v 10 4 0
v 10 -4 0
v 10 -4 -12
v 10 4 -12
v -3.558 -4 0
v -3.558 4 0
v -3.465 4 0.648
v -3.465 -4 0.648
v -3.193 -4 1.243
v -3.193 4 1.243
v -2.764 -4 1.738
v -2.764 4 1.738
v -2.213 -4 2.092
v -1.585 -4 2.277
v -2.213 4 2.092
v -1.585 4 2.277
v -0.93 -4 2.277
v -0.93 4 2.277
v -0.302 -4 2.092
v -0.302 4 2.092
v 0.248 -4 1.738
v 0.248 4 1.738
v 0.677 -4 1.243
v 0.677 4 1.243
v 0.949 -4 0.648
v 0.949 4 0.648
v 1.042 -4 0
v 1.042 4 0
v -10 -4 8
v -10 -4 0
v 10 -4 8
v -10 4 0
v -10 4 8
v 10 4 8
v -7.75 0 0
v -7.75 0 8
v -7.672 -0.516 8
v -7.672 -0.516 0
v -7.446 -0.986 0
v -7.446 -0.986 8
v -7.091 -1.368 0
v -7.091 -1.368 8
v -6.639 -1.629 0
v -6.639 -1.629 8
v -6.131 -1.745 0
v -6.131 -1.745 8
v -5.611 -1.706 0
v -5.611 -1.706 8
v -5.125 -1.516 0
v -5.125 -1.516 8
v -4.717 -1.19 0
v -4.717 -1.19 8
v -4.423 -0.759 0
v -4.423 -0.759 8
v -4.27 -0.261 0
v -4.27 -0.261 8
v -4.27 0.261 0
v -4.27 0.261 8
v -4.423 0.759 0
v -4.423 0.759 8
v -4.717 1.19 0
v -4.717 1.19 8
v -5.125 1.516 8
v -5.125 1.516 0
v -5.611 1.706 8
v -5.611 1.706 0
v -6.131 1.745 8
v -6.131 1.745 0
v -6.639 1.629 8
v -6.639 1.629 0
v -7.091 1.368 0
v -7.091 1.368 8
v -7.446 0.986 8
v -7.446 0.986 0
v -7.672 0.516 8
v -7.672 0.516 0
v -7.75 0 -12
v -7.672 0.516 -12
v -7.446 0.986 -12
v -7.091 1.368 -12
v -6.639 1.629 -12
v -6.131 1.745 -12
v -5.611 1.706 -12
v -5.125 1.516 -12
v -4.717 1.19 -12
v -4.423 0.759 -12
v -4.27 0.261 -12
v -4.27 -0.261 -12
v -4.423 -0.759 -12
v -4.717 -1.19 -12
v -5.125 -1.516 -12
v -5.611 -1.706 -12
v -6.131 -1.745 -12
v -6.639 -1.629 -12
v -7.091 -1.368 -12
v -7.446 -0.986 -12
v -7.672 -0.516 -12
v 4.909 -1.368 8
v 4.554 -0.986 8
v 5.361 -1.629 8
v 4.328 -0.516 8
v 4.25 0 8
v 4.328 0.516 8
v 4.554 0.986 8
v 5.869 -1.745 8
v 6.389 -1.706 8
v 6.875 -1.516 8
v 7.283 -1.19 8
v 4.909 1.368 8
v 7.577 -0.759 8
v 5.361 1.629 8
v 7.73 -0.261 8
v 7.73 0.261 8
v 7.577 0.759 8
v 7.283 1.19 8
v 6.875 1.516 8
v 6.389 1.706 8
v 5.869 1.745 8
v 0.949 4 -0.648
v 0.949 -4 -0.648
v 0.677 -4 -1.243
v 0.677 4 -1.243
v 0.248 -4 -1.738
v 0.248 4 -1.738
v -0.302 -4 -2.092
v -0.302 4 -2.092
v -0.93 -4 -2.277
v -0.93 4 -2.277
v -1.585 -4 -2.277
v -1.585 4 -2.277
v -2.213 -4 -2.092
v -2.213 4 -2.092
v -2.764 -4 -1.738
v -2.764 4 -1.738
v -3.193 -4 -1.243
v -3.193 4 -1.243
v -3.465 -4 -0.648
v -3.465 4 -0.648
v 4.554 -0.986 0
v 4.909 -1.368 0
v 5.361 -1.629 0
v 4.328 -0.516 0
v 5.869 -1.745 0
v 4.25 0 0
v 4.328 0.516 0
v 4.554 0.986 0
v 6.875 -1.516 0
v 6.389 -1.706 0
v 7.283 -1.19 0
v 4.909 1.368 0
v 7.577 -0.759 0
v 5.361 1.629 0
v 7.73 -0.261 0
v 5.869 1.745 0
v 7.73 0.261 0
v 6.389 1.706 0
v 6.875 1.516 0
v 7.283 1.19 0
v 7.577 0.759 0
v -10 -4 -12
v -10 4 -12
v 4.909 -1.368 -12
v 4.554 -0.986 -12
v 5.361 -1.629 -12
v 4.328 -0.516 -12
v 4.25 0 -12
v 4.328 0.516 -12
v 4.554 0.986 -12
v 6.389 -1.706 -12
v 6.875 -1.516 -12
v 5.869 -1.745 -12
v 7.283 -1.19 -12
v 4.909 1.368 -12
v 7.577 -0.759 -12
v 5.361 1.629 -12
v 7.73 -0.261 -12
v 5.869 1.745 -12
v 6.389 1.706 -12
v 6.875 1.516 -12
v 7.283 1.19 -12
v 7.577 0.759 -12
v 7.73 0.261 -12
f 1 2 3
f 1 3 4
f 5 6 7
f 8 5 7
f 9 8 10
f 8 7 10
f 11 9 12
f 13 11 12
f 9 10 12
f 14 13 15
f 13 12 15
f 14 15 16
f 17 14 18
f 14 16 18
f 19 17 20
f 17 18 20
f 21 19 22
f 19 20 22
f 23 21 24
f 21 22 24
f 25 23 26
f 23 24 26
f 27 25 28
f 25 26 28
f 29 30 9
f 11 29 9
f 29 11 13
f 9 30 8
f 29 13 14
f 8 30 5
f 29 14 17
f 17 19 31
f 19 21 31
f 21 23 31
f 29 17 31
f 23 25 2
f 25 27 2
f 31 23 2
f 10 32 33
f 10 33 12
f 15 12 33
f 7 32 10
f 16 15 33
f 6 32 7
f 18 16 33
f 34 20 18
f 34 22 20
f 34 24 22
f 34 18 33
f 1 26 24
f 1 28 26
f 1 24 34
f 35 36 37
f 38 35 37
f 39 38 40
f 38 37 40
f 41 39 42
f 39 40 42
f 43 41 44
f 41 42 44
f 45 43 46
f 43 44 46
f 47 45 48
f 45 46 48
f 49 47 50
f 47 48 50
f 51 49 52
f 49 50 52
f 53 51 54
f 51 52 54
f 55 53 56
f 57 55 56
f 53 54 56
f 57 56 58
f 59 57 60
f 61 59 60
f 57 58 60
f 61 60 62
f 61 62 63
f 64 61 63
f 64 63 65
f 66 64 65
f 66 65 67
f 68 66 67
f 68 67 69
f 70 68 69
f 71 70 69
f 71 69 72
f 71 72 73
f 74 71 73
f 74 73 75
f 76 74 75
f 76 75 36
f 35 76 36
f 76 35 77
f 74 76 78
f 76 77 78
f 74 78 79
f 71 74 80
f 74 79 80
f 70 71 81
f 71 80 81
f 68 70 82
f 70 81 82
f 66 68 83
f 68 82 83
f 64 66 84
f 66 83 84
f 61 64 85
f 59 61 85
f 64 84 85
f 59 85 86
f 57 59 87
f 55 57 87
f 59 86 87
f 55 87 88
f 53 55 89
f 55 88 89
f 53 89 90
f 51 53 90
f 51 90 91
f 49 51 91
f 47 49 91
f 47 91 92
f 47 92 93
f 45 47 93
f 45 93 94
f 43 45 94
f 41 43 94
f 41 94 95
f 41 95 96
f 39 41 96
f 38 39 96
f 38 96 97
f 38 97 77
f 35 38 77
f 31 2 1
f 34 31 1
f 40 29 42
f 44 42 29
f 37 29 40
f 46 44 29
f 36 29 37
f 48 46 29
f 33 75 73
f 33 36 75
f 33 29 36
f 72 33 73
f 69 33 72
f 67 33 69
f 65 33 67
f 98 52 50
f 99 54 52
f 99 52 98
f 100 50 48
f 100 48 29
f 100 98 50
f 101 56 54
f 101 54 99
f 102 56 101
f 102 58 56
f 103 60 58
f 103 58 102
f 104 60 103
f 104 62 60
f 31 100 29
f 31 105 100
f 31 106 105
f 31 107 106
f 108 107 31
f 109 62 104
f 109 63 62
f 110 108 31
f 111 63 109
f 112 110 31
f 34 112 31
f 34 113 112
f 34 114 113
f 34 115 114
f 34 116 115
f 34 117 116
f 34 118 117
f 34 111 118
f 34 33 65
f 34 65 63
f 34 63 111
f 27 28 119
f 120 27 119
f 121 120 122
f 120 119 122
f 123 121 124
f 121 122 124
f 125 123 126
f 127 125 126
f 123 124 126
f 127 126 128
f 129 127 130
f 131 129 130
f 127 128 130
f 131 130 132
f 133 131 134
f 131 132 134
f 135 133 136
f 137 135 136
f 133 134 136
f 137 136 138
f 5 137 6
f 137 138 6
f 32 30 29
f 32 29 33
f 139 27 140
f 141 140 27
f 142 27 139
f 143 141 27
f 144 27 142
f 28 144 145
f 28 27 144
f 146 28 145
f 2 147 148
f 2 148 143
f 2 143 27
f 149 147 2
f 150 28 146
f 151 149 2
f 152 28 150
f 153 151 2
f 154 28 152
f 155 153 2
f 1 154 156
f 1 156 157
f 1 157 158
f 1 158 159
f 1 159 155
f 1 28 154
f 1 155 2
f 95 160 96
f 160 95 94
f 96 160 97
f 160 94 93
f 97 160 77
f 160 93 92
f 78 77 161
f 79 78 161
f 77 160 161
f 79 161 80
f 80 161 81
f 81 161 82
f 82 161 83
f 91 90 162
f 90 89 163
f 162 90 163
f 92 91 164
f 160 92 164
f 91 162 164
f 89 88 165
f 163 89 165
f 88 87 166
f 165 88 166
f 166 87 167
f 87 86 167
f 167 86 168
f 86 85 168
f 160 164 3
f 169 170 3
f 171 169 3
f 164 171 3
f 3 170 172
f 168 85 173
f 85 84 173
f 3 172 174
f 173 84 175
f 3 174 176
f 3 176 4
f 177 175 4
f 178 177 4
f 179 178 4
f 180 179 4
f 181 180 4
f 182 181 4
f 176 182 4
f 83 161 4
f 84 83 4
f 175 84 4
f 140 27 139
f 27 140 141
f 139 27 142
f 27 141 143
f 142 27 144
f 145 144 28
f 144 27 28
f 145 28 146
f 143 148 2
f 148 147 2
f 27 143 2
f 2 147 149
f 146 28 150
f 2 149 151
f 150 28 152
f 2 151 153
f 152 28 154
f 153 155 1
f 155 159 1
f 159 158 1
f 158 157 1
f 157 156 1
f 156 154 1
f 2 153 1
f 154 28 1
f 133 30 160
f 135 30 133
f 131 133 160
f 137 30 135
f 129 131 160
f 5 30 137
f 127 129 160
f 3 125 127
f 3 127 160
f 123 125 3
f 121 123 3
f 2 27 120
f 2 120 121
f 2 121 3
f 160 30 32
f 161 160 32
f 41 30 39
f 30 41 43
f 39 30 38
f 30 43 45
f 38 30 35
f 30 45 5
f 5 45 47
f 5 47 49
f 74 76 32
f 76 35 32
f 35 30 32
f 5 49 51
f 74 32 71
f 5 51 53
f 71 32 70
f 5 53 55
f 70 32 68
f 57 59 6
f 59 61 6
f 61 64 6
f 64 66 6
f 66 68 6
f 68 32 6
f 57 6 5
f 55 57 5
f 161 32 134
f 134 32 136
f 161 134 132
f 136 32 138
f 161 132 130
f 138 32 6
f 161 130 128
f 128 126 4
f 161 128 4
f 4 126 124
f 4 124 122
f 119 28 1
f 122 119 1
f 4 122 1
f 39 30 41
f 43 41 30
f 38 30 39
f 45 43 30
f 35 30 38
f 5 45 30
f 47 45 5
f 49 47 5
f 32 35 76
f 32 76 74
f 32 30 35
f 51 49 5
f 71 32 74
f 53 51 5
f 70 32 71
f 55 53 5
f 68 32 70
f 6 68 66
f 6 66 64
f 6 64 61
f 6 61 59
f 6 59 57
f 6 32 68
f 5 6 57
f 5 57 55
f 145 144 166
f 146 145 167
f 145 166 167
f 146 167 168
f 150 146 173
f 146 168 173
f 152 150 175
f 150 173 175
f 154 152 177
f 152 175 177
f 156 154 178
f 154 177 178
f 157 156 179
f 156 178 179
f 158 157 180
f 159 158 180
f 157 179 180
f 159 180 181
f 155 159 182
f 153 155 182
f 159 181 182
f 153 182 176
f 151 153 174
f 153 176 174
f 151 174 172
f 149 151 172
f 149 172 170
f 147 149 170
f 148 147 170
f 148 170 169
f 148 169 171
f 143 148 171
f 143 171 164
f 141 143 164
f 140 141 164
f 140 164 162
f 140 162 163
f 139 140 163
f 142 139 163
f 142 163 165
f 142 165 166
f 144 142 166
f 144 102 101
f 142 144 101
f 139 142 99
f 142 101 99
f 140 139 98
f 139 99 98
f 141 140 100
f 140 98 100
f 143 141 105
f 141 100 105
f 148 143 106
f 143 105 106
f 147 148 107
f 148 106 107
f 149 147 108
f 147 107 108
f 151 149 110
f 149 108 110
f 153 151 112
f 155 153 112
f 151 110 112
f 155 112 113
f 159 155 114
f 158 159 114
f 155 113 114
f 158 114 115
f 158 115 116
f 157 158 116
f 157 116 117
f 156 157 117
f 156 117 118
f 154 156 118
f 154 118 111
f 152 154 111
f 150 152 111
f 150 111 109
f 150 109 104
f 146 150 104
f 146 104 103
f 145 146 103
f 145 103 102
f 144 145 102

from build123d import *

# Parameters (mm, degrees)
F0_W     = 20
F0_H     = 8
F1_DEPTH = 12
F2_D     = 3.5
F3_DEPTH = 8
F4_D     = 3.5
F6_D     = 4.6
F6_2_D   = 4.6


with BuildPart() as f1:
    # F0 (on Top) → F1 (new body)
    with BuildSketch(Plane.XY):
        Rectangle(F0_W, F0_H)
    extrude(amount=-F1_DEPTH)

    # F2 (through all)
    with Locations(Plane.XY):
        with Locations((6, 0), (-6, 0)):
            Hole(F2_D / 2)

    # F6 (through all)
    with Locations(Plane.XZ.offset(4)):
        with Locations((-1.257777, 0)):
            Hole(F6_D / 2)


with BuildPart() as f3:
    # F0 (on Top) → F3 (new body)
    with BuildSketch(Plane.XY):
        Rectangle(F0_W, F0_H)
    extrude(amount=F3_DEPTH)

    # F4 (through all)
    with Locations(Plane(origin=(0, 0, 0), x_dir=(1, 0, 0), z_dir=(0, 0, -1))):
        with Locations((-6, 0), (6, 0)):
            Hole(F4_D / 2)

    # F6#2 (through all)
    with Locations(Plane.XZ.offset(4)):
        with Locations((-1.257777, 0)):
            Hole(F6_2_D / 2)


solid = Compound([f1.part, f3.part])
